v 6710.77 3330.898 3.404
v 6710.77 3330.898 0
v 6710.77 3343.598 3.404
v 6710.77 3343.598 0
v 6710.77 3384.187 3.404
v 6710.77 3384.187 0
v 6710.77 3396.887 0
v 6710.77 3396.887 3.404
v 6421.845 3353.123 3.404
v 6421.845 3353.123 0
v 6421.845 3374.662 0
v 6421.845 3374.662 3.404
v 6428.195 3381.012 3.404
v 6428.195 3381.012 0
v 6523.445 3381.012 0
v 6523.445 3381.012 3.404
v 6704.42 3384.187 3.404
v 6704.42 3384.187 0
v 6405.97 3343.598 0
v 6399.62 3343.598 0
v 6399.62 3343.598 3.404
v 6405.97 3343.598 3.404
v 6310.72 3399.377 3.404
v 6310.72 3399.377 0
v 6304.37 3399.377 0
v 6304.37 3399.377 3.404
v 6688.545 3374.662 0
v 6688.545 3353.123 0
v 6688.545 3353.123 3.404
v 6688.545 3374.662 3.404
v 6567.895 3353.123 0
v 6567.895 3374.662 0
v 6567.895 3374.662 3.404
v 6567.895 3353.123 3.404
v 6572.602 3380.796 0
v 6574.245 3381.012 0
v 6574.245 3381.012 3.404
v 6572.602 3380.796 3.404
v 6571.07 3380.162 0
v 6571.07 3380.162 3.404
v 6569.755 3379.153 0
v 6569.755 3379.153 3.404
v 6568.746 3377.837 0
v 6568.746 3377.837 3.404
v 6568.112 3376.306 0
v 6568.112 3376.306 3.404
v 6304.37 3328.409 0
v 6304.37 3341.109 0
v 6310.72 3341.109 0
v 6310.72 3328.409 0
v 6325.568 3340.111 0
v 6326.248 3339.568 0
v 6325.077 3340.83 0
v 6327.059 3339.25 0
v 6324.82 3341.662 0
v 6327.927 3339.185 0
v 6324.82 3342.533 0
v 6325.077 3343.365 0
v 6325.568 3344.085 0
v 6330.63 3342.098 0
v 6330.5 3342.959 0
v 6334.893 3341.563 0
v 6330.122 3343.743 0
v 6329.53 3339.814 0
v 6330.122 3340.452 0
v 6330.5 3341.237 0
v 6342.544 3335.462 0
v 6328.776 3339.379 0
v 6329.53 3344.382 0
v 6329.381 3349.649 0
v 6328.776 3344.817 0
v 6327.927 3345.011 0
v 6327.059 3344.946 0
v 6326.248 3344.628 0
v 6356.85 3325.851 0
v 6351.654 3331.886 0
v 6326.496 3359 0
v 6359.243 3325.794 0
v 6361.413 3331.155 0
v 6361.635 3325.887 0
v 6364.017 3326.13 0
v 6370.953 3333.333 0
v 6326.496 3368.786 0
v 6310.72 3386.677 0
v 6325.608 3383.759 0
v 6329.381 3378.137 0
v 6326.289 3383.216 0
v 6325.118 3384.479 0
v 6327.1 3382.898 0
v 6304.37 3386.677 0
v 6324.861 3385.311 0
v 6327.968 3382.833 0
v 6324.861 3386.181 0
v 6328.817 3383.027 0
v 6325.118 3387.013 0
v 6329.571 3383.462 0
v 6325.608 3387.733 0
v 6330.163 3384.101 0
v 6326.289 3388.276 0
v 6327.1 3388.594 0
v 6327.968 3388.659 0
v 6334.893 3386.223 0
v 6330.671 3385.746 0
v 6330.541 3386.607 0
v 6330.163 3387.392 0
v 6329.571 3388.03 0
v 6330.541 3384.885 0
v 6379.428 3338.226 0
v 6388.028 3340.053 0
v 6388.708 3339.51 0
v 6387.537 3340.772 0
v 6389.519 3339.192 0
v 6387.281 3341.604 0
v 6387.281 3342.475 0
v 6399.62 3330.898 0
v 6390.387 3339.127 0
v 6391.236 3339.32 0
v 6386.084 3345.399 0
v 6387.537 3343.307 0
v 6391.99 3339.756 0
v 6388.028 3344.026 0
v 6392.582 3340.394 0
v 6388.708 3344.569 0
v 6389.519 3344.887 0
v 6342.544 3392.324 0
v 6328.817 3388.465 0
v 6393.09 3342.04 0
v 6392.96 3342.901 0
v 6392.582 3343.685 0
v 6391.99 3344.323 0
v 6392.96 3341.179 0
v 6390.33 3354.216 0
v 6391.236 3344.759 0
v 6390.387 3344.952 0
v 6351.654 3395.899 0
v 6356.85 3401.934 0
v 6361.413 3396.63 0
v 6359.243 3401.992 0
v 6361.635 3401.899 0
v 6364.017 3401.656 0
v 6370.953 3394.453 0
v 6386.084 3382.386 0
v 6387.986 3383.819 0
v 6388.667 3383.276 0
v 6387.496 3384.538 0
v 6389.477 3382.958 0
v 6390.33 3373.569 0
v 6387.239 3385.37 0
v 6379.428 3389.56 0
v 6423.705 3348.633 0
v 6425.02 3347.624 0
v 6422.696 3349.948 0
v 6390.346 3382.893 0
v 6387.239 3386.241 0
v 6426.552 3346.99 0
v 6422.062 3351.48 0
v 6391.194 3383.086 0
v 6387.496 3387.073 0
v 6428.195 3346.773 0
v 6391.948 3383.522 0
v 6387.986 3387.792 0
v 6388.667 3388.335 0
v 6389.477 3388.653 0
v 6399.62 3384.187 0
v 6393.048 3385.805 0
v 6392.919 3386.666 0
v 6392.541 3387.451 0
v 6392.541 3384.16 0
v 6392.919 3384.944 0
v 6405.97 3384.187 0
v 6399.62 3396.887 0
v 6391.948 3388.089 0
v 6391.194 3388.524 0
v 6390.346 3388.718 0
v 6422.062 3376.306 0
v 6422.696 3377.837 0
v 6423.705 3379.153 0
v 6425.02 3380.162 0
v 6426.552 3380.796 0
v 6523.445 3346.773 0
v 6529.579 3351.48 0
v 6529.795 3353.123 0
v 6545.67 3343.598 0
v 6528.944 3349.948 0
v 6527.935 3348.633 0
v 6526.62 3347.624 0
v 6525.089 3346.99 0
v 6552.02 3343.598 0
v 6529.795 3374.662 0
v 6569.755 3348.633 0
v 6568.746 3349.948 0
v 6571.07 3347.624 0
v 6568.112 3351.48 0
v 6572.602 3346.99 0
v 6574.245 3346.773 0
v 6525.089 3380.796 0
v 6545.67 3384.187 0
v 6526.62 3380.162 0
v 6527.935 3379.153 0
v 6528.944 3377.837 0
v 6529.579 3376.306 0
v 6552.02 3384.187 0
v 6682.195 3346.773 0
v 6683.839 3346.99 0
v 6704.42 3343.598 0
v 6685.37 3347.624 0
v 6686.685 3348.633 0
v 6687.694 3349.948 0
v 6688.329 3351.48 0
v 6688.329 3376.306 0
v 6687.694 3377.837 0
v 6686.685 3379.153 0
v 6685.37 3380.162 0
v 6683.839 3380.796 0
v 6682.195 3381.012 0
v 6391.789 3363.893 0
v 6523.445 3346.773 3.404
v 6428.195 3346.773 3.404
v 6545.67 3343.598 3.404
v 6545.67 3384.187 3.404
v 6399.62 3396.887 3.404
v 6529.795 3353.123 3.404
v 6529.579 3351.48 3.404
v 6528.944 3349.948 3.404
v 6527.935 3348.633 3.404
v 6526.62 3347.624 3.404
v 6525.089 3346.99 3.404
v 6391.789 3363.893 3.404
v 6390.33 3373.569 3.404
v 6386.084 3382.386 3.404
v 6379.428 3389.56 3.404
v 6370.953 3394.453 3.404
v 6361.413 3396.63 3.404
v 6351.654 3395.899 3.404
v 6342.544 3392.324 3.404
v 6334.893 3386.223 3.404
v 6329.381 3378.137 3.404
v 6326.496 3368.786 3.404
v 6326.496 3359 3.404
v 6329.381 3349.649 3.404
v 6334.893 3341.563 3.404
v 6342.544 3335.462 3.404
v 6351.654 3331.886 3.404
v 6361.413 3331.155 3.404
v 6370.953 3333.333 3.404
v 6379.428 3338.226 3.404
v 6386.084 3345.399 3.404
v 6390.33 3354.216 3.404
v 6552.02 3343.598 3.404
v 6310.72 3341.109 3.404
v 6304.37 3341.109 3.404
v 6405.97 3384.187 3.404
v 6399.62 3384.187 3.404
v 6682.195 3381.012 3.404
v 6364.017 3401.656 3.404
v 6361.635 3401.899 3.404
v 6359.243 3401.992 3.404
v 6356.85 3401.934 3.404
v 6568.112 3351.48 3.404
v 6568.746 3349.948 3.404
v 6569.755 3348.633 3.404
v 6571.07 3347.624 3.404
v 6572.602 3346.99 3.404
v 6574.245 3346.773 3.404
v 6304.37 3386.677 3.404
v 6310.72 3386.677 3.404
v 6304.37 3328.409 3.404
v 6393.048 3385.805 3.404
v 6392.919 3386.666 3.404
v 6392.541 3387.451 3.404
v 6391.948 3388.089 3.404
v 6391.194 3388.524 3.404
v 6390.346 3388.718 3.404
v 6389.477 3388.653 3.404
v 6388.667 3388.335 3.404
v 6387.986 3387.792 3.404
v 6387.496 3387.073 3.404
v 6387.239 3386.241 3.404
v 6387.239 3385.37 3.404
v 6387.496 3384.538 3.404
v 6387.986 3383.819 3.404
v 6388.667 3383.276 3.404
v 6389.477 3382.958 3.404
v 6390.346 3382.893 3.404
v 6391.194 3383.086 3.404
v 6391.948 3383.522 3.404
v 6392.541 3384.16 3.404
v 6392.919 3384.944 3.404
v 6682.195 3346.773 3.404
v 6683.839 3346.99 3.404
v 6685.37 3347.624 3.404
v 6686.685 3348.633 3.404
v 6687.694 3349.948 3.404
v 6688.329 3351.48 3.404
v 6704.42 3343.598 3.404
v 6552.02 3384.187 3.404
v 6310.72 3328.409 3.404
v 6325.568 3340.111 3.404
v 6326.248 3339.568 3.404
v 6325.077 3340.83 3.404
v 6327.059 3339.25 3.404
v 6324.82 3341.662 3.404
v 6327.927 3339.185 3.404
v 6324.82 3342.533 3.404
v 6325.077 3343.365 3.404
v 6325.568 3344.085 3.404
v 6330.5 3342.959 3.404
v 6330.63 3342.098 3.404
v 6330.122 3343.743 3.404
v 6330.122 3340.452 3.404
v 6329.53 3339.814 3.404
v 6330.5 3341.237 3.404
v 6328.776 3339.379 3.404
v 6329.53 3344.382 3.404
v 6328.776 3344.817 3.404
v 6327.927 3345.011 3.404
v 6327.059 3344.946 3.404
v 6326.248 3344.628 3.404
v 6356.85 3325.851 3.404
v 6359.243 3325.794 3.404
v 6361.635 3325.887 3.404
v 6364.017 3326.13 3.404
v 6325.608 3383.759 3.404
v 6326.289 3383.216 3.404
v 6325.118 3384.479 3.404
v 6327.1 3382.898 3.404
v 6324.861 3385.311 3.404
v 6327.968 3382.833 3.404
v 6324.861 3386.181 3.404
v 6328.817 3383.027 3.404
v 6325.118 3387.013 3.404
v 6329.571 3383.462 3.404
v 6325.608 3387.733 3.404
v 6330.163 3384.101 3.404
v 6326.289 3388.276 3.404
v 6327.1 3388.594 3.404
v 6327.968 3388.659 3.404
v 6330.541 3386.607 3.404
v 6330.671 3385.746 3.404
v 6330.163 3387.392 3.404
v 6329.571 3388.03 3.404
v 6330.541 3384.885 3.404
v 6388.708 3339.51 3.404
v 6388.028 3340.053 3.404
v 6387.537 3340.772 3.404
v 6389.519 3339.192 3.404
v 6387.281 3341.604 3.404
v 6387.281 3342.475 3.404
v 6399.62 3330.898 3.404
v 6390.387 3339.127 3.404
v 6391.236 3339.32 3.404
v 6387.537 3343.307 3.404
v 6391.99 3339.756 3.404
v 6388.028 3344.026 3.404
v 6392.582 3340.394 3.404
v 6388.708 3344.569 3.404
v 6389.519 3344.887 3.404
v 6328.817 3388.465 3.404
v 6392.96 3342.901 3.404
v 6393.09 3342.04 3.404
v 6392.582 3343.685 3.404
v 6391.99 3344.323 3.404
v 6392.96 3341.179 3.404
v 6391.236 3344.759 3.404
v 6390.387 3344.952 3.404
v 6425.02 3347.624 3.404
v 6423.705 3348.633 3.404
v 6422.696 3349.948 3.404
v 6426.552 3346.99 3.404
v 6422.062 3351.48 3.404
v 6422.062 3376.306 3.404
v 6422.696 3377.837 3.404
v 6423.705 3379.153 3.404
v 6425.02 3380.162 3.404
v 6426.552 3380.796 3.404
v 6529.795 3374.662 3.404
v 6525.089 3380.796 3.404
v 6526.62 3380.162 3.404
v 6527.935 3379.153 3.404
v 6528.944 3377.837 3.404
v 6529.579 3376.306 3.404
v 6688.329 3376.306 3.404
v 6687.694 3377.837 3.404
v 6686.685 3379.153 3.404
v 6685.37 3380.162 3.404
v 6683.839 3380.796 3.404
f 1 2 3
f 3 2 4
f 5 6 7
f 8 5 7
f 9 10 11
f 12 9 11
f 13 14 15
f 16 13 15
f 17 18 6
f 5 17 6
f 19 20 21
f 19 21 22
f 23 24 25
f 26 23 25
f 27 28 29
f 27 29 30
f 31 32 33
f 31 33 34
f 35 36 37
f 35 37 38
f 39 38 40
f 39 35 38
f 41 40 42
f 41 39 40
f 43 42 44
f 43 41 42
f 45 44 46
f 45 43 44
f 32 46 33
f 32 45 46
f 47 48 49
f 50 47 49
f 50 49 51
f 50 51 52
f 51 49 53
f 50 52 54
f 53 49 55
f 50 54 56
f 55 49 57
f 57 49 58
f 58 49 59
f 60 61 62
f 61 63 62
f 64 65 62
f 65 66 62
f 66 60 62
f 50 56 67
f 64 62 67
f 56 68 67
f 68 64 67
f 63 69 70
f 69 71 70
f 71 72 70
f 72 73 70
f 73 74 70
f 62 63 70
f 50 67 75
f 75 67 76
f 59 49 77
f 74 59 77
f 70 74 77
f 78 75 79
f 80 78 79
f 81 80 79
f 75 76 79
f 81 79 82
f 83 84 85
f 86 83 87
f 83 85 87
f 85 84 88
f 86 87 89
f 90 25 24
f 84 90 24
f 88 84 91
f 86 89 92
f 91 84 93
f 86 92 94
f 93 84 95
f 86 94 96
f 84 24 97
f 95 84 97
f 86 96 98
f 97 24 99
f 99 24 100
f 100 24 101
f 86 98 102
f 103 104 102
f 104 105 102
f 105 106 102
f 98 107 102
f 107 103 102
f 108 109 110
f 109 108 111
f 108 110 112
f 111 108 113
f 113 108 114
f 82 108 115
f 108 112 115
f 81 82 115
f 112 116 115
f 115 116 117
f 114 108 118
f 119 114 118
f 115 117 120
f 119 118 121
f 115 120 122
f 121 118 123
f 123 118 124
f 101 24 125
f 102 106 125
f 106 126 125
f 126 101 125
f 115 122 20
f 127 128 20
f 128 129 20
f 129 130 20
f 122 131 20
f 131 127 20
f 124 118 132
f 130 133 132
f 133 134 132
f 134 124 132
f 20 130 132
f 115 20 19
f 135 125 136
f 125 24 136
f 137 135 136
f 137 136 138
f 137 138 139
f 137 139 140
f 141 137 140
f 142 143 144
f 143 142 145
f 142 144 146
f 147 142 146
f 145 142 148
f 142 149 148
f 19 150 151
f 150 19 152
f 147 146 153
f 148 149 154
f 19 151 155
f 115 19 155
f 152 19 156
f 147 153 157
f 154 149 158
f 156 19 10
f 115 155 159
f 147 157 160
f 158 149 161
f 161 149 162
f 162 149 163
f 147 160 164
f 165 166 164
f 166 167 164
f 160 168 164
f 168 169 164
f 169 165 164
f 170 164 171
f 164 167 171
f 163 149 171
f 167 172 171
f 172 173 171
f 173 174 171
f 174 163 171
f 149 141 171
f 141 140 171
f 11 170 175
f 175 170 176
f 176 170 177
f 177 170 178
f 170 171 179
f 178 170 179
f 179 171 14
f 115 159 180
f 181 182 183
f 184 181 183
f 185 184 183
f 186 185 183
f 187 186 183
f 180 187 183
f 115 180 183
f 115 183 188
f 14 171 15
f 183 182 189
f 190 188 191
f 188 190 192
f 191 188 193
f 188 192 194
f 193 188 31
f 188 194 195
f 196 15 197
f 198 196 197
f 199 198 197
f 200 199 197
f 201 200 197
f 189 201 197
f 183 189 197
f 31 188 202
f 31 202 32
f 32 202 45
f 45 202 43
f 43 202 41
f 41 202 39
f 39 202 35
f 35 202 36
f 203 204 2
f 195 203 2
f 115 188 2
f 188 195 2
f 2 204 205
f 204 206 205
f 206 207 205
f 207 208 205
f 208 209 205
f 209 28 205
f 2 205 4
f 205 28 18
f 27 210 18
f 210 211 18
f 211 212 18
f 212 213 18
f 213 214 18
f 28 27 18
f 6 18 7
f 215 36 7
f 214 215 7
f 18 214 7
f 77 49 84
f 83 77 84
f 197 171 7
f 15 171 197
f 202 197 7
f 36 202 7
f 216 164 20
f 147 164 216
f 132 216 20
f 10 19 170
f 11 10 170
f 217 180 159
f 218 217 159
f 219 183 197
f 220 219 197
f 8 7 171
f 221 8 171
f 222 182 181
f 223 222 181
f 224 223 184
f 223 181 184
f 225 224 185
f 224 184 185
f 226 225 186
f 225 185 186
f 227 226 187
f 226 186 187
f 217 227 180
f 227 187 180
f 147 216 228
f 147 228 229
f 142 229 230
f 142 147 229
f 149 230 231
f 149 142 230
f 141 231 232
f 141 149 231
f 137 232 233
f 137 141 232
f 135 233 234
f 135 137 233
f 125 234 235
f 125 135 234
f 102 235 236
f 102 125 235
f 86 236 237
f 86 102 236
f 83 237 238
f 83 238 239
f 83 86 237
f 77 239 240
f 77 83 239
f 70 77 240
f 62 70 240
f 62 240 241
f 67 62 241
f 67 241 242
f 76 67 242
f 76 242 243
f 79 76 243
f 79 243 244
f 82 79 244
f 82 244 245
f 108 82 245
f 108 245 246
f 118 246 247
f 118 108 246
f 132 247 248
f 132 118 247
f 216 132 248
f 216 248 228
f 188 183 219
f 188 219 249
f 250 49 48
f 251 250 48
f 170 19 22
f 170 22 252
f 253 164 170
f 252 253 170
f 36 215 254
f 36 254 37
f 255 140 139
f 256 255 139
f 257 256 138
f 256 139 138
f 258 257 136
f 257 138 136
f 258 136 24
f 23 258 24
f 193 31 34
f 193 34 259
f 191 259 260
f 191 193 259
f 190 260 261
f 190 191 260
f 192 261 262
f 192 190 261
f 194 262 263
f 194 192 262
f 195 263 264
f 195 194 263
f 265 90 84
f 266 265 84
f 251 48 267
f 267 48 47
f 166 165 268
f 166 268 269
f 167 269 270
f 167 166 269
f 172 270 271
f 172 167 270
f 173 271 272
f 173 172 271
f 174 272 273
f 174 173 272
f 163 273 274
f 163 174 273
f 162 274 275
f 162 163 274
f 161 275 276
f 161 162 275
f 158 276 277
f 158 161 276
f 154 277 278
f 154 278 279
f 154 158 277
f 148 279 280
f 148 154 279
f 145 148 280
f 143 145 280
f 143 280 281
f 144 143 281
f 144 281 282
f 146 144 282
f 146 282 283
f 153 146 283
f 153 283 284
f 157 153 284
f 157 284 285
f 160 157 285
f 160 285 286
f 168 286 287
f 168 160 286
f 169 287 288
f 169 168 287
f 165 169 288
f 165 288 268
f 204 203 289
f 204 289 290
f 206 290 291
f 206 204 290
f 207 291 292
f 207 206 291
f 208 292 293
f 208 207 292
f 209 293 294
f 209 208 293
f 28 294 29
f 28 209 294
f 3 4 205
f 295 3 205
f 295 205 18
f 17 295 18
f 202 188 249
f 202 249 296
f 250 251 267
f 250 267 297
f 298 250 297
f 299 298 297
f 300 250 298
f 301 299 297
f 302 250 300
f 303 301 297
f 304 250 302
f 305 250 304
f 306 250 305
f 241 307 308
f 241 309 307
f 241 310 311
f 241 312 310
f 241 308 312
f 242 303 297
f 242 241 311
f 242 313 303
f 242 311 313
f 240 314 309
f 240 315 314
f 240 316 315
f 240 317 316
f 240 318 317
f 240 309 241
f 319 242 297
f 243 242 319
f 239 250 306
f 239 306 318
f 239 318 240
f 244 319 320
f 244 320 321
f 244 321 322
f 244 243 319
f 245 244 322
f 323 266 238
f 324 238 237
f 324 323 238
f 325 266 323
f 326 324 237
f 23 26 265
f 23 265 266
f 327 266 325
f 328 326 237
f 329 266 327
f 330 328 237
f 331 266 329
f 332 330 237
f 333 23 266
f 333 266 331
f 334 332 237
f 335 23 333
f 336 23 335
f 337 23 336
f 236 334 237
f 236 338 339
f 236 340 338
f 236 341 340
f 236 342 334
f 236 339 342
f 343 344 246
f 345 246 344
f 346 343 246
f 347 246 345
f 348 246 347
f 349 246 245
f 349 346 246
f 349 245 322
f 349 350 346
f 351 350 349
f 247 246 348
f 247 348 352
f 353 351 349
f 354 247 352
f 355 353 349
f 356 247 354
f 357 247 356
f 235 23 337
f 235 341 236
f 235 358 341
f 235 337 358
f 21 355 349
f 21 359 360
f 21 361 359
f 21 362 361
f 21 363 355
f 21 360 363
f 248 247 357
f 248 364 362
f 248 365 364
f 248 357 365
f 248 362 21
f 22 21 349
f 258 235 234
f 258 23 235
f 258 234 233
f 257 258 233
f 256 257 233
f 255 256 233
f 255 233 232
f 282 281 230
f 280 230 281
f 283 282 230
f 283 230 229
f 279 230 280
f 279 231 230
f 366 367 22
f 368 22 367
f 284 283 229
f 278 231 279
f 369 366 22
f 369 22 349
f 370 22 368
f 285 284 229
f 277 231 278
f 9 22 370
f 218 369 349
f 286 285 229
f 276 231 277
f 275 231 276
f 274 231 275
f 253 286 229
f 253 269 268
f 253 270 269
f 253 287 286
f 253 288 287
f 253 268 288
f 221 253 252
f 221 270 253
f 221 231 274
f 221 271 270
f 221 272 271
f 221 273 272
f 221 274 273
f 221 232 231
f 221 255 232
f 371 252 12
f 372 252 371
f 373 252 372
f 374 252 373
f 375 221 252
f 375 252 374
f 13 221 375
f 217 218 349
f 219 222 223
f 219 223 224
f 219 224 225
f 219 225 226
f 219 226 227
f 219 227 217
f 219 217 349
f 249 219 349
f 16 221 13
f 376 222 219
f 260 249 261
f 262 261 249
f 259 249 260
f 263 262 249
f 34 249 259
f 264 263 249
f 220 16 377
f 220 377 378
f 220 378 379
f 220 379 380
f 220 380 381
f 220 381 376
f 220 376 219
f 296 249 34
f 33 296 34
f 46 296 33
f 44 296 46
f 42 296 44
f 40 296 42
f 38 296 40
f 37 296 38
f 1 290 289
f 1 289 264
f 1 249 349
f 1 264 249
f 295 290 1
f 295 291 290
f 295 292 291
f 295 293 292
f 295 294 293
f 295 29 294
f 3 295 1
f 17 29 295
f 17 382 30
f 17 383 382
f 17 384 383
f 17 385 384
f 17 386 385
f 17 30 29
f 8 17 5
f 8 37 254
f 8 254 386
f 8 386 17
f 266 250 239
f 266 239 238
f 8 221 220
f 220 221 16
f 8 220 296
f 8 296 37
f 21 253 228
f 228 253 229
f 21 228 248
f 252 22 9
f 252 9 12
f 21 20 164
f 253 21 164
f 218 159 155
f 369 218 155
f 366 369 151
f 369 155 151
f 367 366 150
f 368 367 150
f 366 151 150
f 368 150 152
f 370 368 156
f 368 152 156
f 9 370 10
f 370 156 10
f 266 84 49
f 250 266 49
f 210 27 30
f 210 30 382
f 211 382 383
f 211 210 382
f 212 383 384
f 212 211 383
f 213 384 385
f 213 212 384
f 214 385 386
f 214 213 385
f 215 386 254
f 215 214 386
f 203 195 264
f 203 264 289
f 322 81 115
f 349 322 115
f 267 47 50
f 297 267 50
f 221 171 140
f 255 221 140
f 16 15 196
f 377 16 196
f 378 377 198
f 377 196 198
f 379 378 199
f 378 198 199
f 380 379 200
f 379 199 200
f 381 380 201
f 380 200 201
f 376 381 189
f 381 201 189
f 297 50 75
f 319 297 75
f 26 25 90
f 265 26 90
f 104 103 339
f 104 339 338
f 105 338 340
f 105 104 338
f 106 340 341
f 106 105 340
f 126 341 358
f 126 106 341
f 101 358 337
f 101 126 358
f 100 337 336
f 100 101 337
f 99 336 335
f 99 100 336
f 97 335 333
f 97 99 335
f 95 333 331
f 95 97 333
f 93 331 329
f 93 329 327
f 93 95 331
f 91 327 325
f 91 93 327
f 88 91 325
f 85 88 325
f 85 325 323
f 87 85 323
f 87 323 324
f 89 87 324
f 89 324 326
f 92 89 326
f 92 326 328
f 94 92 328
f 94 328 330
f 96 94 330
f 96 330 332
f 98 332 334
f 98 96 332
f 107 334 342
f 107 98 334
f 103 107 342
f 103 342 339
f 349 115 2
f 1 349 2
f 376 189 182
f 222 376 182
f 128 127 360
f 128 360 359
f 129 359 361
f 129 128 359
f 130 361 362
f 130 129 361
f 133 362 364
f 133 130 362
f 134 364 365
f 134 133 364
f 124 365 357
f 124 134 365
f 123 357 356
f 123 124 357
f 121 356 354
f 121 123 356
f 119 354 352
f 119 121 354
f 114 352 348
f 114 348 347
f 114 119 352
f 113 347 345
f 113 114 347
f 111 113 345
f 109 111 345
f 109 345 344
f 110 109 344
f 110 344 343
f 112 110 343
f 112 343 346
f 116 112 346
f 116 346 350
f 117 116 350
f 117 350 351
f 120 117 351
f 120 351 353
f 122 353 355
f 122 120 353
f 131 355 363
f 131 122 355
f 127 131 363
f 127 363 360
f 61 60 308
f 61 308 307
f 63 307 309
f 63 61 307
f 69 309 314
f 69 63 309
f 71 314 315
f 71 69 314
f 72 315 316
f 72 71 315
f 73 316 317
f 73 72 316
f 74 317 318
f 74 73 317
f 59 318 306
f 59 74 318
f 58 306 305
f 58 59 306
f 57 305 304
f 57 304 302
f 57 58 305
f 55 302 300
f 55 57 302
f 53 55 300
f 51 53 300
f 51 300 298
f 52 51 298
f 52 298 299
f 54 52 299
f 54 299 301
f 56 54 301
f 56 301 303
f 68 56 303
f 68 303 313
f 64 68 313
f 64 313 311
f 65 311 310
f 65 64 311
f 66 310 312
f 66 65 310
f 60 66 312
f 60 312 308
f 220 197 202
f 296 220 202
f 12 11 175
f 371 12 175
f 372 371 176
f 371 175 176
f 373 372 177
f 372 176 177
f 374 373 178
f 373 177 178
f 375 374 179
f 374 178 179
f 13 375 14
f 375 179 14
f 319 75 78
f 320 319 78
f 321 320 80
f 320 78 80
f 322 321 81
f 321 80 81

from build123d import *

# Parameters (mm, degrees)
SKETCH1_R           = 32.8295
SKETCH1_R_2         = 2.921000021
SKETCH1_W           = 6.35
SKETCH1_H           = 40.5892
BOSS_EXTRUDE1_DEPTH = 3.4036


with BuildPart() as part:
    # Sketch1 → Boss-Extrude1 (new body)
    with BuildSketch(Plane.XY):
        with BuildLine():
            Line((6310.72013516, 3386.676584946), (6310.72013516, 3341.108984946))
            Line((6310.72013516, 3341.108984946), (6304.37013516, 3341.108984946))
            Line((6304.37013516, 3341.108984946), (6304.37013516, 3328.408984946))
            Line((6304.37013516, 3328.408984946), (6310.72013516, 3328.408984946))
            Line((6310.72013516, 3328.408984946), (6356.849906468, 3325.851217453))
            ThreePointArc((6356.849906468, 3325.851217453), (6360.439847706, 3325.821566173), (6364.016642615, 3326.129941694))
            Line((6364.016642615, 3326.129941694), (6399.62013516, 3330.898184946))
            Line((6399.62013516, 3330.898184946), (6710.77013516, 3330.898184946))
            Line((6710.77013516, 3330.898184946), (6710.77013516, 3343.598184946))
            Line((6710.77013516, 3343.598184946), (6704.42013516, 3343.598184946))
            Line((6704.42013516, 3343.598184946), (6704.42013516, 3384.187384946))
            Line((6704.42013516, 3384.187384946), (6710.77013516, 3384.187384946))
            Line((6710.77013516, 3384.187384946), (6710.77013516, 3396.887384946))
            Line((6710.77013516, 3396.887384946), (6399.62013516, 3396.887384946))
            Line((6399.62013516, 3396.887384946), (6364.016642615, 3401.655628197))
            ThreePointArc((6364.016642615, 3401.655628197), (6360.439847706, 3401.964003719), (6356.849906468, 3401.934352439))
            Line((6356.849906468, 3401.934352439), (6310.72013516, 3399.376584946))
            Line((6310.72013516, 3399.376584946), (6304.37013516, 3399.376584946))
            Line((6304.37013516, 3399.376584946), (6304.37013516, 3386.676584946))
            Line((6304.37013516, 3386.676584946), (6310.72013516, 3386.676584946))
        make_face()
        with Locations((6358.95920556, 3363.892784946)):
            Circle(SKETCH1_R, mode=Mode.SUBTRACT)
        with Locations((6327.70875532, 3342.097845648)):
            Circle(SKETCH1_R_2, mode=Mode.SUBTRACT)
        with Locations((6390.168898653, 3342.039522577)):
            Circle(SKETCH1_R_2, mode=Mode.SUBTRACT)
        with Locations((6390.127285576, 3385.805356845)):
            Circle(SKETCH1_R_2, mode=Mode.SUBTRACT)
        with Locations((6327.749512467, 3385.746047315)):
            Circle(SKETCH1_R_2, mode=Mode.SUBTRACT)
        with Locations((6402.79513516, 3363.892784946)):
            Rectangle(SKETCH1_W, SKETCH1_H, mode=Mode.SUBTRACT)
        with BuildLine():
            Line((6421.84513516, 3353.123184946), (6421.84513516, 3374.662384946))
            ThreePointArc((6421.84513516, 3374.662384946), (6423.705007099, 3379.152513006), (6428.19513516, 3381.012384946))
            Line((6428.19513516, 3381.012384946), (6523.44513516, 3381.012384946))
            ThreePointArc((6523.44513516, 3381.012384946), (6527.93526322, 3379.152513006), (6529.79513516, 3374.662384946))
            Line((6529.79513516, 3374.662384946), (6529.79513516, 3353.123184946))
            ThreePointArc((6529.79513516, 3353.123184946), (6527.93526322, 3348.633056885), (6523.44513516, 3346.773184946))
            Line((6523.44513516, 3346.773184946), (6428.19513516, 3346.773184946))
            ThreePointArc((6428.19513516, 3346.773184946), (6423.705007099, 3348.633056885), (6421.84513516, 3353.123184946))
        make_face(mode=Mode.SUBTRACT)
        with BuildLine():
            Line((6682.19513516, 3381.012384946), (6574.24513516, 3381.012384946))
            ThreePointArc((6574.24513516, 3381.012384946), (6569.755007099, 3379.152513006), (6567.89513516, 3374.662384946))
            Line((6567.89513516, 3374.662384946), (6567.89513516, 3353.123184946))
            ThreePointArc((6567.89513516, 3353.123184946), (6569.755007099, 3348.633056885), (6574.24513516, 3346.773184946))
            Line((6574.24513516, 3346.773184946), (6682.19513516, 3346.773184946))
            ThreePointArc((6682.19513516, 3346.773184946), (6686.68526322, 3348.633056885), (6688.54513516, 3353.123184946))
            Line((6688.54513516, 3353.123184946), (6688.54513516, 3374.662384946))
            ThreePointArc((6688.54513516, 3374.662384946), (6686.68526322, 3379.152513006), (6682.19513516, 3381.012384946))
        make_face(mode=Mode.SUBTRACT)
        with Locations((6548.84513516, 3363.892784946)):
            Rectangle(SKETCH1_W, SKETCH1_H, mode=Mode.SUBTRACT)
    extrude(amount=BOSS_EXTRUDE1_DEPTH)


solid = part.part
